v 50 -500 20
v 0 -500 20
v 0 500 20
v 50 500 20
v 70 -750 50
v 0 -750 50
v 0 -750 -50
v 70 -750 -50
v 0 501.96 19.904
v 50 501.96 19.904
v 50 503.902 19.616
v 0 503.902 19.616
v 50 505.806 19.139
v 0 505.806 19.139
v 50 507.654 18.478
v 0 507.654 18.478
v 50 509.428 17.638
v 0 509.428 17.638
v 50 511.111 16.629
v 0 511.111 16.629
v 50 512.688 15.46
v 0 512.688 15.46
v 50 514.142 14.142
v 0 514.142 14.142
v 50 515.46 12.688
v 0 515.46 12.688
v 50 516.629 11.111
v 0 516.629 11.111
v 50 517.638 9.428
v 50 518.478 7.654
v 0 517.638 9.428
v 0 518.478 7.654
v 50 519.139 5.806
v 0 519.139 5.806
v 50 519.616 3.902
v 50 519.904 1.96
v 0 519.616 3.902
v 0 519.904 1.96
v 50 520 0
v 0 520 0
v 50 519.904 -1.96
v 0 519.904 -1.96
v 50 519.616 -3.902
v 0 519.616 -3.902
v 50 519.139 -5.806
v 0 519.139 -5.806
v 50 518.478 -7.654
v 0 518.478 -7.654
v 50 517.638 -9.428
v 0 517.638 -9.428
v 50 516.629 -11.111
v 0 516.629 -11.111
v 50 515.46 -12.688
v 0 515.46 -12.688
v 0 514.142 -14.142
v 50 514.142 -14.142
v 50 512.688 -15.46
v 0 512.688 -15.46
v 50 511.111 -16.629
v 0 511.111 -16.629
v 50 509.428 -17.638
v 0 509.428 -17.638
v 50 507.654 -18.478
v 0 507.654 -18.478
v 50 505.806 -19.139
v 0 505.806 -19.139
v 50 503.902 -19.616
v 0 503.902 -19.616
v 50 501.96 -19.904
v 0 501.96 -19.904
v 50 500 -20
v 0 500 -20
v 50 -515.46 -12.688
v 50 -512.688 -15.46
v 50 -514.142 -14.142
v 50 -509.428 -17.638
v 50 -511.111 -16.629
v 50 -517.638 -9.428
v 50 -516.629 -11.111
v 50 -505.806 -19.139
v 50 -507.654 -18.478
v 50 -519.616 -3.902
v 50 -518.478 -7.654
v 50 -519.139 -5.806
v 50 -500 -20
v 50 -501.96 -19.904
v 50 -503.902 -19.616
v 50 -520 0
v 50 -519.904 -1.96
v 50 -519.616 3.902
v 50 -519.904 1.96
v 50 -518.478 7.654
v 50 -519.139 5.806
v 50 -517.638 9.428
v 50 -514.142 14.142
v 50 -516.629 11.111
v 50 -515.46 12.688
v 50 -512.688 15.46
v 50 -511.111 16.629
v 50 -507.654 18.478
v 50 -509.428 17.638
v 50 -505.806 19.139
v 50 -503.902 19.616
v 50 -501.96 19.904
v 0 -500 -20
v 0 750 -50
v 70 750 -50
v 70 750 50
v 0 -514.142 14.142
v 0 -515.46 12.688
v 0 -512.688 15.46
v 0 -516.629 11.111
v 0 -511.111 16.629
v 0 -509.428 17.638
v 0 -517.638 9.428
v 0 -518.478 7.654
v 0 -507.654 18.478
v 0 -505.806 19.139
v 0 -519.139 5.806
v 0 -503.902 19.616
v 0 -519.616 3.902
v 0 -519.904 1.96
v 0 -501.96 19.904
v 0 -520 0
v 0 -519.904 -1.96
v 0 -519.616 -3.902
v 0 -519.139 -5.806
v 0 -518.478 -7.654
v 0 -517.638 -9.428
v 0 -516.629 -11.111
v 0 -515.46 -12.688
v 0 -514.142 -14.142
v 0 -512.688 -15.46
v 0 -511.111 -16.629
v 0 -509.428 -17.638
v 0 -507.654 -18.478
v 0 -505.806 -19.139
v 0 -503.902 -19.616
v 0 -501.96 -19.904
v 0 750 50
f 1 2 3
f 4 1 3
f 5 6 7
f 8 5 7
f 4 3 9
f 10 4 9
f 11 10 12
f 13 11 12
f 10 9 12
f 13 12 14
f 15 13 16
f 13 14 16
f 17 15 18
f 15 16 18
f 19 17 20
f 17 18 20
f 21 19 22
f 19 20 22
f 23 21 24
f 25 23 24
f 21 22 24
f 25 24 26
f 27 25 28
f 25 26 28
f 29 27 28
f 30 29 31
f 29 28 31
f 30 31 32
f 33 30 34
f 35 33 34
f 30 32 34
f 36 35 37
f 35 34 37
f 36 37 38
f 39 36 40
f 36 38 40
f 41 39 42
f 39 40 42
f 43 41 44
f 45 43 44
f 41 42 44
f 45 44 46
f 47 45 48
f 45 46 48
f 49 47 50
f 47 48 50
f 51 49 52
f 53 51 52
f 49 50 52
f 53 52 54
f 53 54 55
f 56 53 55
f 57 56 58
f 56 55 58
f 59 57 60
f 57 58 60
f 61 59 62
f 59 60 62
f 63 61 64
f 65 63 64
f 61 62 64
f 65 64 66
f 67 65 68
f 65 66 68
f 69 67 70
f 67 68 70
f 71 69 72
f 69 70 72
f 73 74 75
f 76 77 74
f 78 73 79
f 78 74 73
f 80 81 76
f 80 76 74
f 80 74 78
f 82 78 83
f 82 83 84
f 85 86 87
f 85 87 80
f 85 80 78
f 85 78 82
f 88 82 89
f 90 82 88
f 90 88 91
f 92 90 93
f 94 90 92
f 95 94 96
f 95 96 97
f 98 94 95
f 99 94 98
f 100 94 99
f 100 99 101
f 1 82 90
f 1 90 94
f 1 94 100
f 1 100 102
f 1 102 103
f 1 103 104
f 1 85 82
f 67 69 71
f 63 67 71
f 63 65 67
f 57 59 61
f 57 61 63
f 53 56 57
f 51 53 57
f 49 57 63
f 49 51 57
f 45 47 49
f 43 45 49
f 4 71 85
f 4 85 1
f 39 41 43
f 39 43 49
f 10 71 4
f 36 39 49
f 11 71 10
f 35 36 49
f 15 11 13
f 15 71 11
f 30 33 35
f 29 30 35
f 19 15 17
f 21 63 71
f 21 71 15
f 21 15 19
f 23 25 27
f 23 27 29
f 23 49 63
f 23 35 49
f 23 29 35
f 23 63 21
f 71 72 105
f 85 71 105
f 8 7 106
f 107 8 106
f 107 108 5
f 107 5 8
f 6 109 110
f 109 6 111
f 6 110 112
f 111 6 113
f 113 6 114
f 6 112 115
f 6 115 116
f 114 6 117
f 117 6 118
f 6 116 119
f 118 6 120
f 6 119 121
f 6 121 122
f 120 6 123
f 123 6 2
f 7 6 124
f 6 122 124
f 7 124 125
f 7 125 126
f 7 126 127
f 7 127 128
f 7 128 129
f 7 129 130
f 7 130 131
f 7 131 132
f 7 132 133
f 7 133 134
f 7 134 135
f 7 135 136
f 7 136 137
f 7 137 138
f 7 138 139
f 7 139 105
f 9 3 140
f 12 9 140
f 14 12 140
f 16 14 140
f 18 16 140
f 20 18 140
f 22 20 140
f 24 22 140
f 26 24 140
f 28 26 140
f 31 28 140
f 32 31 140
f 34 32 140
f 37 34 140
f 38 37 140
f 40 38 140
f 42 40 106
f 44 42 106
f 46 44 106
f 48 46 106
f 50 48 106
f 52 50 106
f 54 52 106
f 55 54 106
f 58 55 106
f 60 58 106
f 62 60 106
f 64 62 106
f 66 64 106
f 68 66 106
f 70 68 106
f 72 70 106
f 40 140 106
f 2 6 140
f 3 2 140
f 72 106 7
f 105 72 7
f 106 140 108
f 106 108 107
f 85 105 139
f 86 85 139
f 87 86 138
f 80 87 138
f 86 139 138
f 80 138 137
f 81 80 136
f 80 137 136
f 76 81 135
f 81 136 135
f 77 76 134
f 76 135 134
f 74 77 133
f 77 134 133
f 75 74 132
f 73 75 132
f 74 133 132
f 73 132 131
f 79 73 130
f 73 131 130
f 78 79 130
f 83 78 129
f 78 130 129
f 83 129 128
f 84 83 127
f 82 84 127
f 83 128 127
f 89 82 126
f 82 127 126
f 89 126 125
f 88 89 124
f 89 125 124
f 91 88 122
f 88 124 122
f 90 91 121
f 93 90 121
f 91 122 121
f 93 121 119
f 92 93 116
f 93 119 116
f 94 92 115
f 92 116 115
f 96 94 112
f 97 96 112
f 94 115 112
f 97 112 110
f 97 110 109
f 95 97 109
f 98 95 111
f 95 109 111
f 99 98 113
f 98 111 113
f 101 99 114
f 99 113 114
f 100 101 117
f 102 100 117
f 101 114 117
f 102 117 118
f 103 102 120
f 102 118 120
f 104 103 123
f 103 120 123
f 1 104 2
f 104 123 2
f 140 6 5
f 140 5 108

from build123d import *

# Parameters (mm, degrees)
SKETCH3_W           = 100
SKETCH3_H           = 1500
BOSS_EXTRUDE2_DEPTH = 70
CUT_EXTRUDE2_DEPTH  = 50


with BuildPart() as part:
    # Sketch3 → Boss-Extrude2 (new body)
    with BuildSketch(Plane(origin=(0, 0, 0), x_dir=(0, 0, -1), z_dir=(1, 0, 0))):
        Rectangle(SKETCH3_W, SKETCH3_H)
    extrude(amount=BOSS_EXTRUDE2_DEPTH)

    # Sketch7 → Cut-Extrude2 (cut)
    with BuildSketch(Plane(origin=(0, 0, 0), x_dir=(0, 0, -1), z_dir=(1, 0, 0))):
        with BuildLine():
            Line((20, 500), (20, -500))
            ThreePointArc((20, -500), (0, -520), (-20, -500))
            Line((-20, -500), (-20, 500))
            ThreePointArc((-20, 500), (0, 520), (20, 500))
        make_face()
    extrude(amount=CUT_EXTRUDE2_DEPTH, mode=Mode.SUBTRACT)


solid = part.part
